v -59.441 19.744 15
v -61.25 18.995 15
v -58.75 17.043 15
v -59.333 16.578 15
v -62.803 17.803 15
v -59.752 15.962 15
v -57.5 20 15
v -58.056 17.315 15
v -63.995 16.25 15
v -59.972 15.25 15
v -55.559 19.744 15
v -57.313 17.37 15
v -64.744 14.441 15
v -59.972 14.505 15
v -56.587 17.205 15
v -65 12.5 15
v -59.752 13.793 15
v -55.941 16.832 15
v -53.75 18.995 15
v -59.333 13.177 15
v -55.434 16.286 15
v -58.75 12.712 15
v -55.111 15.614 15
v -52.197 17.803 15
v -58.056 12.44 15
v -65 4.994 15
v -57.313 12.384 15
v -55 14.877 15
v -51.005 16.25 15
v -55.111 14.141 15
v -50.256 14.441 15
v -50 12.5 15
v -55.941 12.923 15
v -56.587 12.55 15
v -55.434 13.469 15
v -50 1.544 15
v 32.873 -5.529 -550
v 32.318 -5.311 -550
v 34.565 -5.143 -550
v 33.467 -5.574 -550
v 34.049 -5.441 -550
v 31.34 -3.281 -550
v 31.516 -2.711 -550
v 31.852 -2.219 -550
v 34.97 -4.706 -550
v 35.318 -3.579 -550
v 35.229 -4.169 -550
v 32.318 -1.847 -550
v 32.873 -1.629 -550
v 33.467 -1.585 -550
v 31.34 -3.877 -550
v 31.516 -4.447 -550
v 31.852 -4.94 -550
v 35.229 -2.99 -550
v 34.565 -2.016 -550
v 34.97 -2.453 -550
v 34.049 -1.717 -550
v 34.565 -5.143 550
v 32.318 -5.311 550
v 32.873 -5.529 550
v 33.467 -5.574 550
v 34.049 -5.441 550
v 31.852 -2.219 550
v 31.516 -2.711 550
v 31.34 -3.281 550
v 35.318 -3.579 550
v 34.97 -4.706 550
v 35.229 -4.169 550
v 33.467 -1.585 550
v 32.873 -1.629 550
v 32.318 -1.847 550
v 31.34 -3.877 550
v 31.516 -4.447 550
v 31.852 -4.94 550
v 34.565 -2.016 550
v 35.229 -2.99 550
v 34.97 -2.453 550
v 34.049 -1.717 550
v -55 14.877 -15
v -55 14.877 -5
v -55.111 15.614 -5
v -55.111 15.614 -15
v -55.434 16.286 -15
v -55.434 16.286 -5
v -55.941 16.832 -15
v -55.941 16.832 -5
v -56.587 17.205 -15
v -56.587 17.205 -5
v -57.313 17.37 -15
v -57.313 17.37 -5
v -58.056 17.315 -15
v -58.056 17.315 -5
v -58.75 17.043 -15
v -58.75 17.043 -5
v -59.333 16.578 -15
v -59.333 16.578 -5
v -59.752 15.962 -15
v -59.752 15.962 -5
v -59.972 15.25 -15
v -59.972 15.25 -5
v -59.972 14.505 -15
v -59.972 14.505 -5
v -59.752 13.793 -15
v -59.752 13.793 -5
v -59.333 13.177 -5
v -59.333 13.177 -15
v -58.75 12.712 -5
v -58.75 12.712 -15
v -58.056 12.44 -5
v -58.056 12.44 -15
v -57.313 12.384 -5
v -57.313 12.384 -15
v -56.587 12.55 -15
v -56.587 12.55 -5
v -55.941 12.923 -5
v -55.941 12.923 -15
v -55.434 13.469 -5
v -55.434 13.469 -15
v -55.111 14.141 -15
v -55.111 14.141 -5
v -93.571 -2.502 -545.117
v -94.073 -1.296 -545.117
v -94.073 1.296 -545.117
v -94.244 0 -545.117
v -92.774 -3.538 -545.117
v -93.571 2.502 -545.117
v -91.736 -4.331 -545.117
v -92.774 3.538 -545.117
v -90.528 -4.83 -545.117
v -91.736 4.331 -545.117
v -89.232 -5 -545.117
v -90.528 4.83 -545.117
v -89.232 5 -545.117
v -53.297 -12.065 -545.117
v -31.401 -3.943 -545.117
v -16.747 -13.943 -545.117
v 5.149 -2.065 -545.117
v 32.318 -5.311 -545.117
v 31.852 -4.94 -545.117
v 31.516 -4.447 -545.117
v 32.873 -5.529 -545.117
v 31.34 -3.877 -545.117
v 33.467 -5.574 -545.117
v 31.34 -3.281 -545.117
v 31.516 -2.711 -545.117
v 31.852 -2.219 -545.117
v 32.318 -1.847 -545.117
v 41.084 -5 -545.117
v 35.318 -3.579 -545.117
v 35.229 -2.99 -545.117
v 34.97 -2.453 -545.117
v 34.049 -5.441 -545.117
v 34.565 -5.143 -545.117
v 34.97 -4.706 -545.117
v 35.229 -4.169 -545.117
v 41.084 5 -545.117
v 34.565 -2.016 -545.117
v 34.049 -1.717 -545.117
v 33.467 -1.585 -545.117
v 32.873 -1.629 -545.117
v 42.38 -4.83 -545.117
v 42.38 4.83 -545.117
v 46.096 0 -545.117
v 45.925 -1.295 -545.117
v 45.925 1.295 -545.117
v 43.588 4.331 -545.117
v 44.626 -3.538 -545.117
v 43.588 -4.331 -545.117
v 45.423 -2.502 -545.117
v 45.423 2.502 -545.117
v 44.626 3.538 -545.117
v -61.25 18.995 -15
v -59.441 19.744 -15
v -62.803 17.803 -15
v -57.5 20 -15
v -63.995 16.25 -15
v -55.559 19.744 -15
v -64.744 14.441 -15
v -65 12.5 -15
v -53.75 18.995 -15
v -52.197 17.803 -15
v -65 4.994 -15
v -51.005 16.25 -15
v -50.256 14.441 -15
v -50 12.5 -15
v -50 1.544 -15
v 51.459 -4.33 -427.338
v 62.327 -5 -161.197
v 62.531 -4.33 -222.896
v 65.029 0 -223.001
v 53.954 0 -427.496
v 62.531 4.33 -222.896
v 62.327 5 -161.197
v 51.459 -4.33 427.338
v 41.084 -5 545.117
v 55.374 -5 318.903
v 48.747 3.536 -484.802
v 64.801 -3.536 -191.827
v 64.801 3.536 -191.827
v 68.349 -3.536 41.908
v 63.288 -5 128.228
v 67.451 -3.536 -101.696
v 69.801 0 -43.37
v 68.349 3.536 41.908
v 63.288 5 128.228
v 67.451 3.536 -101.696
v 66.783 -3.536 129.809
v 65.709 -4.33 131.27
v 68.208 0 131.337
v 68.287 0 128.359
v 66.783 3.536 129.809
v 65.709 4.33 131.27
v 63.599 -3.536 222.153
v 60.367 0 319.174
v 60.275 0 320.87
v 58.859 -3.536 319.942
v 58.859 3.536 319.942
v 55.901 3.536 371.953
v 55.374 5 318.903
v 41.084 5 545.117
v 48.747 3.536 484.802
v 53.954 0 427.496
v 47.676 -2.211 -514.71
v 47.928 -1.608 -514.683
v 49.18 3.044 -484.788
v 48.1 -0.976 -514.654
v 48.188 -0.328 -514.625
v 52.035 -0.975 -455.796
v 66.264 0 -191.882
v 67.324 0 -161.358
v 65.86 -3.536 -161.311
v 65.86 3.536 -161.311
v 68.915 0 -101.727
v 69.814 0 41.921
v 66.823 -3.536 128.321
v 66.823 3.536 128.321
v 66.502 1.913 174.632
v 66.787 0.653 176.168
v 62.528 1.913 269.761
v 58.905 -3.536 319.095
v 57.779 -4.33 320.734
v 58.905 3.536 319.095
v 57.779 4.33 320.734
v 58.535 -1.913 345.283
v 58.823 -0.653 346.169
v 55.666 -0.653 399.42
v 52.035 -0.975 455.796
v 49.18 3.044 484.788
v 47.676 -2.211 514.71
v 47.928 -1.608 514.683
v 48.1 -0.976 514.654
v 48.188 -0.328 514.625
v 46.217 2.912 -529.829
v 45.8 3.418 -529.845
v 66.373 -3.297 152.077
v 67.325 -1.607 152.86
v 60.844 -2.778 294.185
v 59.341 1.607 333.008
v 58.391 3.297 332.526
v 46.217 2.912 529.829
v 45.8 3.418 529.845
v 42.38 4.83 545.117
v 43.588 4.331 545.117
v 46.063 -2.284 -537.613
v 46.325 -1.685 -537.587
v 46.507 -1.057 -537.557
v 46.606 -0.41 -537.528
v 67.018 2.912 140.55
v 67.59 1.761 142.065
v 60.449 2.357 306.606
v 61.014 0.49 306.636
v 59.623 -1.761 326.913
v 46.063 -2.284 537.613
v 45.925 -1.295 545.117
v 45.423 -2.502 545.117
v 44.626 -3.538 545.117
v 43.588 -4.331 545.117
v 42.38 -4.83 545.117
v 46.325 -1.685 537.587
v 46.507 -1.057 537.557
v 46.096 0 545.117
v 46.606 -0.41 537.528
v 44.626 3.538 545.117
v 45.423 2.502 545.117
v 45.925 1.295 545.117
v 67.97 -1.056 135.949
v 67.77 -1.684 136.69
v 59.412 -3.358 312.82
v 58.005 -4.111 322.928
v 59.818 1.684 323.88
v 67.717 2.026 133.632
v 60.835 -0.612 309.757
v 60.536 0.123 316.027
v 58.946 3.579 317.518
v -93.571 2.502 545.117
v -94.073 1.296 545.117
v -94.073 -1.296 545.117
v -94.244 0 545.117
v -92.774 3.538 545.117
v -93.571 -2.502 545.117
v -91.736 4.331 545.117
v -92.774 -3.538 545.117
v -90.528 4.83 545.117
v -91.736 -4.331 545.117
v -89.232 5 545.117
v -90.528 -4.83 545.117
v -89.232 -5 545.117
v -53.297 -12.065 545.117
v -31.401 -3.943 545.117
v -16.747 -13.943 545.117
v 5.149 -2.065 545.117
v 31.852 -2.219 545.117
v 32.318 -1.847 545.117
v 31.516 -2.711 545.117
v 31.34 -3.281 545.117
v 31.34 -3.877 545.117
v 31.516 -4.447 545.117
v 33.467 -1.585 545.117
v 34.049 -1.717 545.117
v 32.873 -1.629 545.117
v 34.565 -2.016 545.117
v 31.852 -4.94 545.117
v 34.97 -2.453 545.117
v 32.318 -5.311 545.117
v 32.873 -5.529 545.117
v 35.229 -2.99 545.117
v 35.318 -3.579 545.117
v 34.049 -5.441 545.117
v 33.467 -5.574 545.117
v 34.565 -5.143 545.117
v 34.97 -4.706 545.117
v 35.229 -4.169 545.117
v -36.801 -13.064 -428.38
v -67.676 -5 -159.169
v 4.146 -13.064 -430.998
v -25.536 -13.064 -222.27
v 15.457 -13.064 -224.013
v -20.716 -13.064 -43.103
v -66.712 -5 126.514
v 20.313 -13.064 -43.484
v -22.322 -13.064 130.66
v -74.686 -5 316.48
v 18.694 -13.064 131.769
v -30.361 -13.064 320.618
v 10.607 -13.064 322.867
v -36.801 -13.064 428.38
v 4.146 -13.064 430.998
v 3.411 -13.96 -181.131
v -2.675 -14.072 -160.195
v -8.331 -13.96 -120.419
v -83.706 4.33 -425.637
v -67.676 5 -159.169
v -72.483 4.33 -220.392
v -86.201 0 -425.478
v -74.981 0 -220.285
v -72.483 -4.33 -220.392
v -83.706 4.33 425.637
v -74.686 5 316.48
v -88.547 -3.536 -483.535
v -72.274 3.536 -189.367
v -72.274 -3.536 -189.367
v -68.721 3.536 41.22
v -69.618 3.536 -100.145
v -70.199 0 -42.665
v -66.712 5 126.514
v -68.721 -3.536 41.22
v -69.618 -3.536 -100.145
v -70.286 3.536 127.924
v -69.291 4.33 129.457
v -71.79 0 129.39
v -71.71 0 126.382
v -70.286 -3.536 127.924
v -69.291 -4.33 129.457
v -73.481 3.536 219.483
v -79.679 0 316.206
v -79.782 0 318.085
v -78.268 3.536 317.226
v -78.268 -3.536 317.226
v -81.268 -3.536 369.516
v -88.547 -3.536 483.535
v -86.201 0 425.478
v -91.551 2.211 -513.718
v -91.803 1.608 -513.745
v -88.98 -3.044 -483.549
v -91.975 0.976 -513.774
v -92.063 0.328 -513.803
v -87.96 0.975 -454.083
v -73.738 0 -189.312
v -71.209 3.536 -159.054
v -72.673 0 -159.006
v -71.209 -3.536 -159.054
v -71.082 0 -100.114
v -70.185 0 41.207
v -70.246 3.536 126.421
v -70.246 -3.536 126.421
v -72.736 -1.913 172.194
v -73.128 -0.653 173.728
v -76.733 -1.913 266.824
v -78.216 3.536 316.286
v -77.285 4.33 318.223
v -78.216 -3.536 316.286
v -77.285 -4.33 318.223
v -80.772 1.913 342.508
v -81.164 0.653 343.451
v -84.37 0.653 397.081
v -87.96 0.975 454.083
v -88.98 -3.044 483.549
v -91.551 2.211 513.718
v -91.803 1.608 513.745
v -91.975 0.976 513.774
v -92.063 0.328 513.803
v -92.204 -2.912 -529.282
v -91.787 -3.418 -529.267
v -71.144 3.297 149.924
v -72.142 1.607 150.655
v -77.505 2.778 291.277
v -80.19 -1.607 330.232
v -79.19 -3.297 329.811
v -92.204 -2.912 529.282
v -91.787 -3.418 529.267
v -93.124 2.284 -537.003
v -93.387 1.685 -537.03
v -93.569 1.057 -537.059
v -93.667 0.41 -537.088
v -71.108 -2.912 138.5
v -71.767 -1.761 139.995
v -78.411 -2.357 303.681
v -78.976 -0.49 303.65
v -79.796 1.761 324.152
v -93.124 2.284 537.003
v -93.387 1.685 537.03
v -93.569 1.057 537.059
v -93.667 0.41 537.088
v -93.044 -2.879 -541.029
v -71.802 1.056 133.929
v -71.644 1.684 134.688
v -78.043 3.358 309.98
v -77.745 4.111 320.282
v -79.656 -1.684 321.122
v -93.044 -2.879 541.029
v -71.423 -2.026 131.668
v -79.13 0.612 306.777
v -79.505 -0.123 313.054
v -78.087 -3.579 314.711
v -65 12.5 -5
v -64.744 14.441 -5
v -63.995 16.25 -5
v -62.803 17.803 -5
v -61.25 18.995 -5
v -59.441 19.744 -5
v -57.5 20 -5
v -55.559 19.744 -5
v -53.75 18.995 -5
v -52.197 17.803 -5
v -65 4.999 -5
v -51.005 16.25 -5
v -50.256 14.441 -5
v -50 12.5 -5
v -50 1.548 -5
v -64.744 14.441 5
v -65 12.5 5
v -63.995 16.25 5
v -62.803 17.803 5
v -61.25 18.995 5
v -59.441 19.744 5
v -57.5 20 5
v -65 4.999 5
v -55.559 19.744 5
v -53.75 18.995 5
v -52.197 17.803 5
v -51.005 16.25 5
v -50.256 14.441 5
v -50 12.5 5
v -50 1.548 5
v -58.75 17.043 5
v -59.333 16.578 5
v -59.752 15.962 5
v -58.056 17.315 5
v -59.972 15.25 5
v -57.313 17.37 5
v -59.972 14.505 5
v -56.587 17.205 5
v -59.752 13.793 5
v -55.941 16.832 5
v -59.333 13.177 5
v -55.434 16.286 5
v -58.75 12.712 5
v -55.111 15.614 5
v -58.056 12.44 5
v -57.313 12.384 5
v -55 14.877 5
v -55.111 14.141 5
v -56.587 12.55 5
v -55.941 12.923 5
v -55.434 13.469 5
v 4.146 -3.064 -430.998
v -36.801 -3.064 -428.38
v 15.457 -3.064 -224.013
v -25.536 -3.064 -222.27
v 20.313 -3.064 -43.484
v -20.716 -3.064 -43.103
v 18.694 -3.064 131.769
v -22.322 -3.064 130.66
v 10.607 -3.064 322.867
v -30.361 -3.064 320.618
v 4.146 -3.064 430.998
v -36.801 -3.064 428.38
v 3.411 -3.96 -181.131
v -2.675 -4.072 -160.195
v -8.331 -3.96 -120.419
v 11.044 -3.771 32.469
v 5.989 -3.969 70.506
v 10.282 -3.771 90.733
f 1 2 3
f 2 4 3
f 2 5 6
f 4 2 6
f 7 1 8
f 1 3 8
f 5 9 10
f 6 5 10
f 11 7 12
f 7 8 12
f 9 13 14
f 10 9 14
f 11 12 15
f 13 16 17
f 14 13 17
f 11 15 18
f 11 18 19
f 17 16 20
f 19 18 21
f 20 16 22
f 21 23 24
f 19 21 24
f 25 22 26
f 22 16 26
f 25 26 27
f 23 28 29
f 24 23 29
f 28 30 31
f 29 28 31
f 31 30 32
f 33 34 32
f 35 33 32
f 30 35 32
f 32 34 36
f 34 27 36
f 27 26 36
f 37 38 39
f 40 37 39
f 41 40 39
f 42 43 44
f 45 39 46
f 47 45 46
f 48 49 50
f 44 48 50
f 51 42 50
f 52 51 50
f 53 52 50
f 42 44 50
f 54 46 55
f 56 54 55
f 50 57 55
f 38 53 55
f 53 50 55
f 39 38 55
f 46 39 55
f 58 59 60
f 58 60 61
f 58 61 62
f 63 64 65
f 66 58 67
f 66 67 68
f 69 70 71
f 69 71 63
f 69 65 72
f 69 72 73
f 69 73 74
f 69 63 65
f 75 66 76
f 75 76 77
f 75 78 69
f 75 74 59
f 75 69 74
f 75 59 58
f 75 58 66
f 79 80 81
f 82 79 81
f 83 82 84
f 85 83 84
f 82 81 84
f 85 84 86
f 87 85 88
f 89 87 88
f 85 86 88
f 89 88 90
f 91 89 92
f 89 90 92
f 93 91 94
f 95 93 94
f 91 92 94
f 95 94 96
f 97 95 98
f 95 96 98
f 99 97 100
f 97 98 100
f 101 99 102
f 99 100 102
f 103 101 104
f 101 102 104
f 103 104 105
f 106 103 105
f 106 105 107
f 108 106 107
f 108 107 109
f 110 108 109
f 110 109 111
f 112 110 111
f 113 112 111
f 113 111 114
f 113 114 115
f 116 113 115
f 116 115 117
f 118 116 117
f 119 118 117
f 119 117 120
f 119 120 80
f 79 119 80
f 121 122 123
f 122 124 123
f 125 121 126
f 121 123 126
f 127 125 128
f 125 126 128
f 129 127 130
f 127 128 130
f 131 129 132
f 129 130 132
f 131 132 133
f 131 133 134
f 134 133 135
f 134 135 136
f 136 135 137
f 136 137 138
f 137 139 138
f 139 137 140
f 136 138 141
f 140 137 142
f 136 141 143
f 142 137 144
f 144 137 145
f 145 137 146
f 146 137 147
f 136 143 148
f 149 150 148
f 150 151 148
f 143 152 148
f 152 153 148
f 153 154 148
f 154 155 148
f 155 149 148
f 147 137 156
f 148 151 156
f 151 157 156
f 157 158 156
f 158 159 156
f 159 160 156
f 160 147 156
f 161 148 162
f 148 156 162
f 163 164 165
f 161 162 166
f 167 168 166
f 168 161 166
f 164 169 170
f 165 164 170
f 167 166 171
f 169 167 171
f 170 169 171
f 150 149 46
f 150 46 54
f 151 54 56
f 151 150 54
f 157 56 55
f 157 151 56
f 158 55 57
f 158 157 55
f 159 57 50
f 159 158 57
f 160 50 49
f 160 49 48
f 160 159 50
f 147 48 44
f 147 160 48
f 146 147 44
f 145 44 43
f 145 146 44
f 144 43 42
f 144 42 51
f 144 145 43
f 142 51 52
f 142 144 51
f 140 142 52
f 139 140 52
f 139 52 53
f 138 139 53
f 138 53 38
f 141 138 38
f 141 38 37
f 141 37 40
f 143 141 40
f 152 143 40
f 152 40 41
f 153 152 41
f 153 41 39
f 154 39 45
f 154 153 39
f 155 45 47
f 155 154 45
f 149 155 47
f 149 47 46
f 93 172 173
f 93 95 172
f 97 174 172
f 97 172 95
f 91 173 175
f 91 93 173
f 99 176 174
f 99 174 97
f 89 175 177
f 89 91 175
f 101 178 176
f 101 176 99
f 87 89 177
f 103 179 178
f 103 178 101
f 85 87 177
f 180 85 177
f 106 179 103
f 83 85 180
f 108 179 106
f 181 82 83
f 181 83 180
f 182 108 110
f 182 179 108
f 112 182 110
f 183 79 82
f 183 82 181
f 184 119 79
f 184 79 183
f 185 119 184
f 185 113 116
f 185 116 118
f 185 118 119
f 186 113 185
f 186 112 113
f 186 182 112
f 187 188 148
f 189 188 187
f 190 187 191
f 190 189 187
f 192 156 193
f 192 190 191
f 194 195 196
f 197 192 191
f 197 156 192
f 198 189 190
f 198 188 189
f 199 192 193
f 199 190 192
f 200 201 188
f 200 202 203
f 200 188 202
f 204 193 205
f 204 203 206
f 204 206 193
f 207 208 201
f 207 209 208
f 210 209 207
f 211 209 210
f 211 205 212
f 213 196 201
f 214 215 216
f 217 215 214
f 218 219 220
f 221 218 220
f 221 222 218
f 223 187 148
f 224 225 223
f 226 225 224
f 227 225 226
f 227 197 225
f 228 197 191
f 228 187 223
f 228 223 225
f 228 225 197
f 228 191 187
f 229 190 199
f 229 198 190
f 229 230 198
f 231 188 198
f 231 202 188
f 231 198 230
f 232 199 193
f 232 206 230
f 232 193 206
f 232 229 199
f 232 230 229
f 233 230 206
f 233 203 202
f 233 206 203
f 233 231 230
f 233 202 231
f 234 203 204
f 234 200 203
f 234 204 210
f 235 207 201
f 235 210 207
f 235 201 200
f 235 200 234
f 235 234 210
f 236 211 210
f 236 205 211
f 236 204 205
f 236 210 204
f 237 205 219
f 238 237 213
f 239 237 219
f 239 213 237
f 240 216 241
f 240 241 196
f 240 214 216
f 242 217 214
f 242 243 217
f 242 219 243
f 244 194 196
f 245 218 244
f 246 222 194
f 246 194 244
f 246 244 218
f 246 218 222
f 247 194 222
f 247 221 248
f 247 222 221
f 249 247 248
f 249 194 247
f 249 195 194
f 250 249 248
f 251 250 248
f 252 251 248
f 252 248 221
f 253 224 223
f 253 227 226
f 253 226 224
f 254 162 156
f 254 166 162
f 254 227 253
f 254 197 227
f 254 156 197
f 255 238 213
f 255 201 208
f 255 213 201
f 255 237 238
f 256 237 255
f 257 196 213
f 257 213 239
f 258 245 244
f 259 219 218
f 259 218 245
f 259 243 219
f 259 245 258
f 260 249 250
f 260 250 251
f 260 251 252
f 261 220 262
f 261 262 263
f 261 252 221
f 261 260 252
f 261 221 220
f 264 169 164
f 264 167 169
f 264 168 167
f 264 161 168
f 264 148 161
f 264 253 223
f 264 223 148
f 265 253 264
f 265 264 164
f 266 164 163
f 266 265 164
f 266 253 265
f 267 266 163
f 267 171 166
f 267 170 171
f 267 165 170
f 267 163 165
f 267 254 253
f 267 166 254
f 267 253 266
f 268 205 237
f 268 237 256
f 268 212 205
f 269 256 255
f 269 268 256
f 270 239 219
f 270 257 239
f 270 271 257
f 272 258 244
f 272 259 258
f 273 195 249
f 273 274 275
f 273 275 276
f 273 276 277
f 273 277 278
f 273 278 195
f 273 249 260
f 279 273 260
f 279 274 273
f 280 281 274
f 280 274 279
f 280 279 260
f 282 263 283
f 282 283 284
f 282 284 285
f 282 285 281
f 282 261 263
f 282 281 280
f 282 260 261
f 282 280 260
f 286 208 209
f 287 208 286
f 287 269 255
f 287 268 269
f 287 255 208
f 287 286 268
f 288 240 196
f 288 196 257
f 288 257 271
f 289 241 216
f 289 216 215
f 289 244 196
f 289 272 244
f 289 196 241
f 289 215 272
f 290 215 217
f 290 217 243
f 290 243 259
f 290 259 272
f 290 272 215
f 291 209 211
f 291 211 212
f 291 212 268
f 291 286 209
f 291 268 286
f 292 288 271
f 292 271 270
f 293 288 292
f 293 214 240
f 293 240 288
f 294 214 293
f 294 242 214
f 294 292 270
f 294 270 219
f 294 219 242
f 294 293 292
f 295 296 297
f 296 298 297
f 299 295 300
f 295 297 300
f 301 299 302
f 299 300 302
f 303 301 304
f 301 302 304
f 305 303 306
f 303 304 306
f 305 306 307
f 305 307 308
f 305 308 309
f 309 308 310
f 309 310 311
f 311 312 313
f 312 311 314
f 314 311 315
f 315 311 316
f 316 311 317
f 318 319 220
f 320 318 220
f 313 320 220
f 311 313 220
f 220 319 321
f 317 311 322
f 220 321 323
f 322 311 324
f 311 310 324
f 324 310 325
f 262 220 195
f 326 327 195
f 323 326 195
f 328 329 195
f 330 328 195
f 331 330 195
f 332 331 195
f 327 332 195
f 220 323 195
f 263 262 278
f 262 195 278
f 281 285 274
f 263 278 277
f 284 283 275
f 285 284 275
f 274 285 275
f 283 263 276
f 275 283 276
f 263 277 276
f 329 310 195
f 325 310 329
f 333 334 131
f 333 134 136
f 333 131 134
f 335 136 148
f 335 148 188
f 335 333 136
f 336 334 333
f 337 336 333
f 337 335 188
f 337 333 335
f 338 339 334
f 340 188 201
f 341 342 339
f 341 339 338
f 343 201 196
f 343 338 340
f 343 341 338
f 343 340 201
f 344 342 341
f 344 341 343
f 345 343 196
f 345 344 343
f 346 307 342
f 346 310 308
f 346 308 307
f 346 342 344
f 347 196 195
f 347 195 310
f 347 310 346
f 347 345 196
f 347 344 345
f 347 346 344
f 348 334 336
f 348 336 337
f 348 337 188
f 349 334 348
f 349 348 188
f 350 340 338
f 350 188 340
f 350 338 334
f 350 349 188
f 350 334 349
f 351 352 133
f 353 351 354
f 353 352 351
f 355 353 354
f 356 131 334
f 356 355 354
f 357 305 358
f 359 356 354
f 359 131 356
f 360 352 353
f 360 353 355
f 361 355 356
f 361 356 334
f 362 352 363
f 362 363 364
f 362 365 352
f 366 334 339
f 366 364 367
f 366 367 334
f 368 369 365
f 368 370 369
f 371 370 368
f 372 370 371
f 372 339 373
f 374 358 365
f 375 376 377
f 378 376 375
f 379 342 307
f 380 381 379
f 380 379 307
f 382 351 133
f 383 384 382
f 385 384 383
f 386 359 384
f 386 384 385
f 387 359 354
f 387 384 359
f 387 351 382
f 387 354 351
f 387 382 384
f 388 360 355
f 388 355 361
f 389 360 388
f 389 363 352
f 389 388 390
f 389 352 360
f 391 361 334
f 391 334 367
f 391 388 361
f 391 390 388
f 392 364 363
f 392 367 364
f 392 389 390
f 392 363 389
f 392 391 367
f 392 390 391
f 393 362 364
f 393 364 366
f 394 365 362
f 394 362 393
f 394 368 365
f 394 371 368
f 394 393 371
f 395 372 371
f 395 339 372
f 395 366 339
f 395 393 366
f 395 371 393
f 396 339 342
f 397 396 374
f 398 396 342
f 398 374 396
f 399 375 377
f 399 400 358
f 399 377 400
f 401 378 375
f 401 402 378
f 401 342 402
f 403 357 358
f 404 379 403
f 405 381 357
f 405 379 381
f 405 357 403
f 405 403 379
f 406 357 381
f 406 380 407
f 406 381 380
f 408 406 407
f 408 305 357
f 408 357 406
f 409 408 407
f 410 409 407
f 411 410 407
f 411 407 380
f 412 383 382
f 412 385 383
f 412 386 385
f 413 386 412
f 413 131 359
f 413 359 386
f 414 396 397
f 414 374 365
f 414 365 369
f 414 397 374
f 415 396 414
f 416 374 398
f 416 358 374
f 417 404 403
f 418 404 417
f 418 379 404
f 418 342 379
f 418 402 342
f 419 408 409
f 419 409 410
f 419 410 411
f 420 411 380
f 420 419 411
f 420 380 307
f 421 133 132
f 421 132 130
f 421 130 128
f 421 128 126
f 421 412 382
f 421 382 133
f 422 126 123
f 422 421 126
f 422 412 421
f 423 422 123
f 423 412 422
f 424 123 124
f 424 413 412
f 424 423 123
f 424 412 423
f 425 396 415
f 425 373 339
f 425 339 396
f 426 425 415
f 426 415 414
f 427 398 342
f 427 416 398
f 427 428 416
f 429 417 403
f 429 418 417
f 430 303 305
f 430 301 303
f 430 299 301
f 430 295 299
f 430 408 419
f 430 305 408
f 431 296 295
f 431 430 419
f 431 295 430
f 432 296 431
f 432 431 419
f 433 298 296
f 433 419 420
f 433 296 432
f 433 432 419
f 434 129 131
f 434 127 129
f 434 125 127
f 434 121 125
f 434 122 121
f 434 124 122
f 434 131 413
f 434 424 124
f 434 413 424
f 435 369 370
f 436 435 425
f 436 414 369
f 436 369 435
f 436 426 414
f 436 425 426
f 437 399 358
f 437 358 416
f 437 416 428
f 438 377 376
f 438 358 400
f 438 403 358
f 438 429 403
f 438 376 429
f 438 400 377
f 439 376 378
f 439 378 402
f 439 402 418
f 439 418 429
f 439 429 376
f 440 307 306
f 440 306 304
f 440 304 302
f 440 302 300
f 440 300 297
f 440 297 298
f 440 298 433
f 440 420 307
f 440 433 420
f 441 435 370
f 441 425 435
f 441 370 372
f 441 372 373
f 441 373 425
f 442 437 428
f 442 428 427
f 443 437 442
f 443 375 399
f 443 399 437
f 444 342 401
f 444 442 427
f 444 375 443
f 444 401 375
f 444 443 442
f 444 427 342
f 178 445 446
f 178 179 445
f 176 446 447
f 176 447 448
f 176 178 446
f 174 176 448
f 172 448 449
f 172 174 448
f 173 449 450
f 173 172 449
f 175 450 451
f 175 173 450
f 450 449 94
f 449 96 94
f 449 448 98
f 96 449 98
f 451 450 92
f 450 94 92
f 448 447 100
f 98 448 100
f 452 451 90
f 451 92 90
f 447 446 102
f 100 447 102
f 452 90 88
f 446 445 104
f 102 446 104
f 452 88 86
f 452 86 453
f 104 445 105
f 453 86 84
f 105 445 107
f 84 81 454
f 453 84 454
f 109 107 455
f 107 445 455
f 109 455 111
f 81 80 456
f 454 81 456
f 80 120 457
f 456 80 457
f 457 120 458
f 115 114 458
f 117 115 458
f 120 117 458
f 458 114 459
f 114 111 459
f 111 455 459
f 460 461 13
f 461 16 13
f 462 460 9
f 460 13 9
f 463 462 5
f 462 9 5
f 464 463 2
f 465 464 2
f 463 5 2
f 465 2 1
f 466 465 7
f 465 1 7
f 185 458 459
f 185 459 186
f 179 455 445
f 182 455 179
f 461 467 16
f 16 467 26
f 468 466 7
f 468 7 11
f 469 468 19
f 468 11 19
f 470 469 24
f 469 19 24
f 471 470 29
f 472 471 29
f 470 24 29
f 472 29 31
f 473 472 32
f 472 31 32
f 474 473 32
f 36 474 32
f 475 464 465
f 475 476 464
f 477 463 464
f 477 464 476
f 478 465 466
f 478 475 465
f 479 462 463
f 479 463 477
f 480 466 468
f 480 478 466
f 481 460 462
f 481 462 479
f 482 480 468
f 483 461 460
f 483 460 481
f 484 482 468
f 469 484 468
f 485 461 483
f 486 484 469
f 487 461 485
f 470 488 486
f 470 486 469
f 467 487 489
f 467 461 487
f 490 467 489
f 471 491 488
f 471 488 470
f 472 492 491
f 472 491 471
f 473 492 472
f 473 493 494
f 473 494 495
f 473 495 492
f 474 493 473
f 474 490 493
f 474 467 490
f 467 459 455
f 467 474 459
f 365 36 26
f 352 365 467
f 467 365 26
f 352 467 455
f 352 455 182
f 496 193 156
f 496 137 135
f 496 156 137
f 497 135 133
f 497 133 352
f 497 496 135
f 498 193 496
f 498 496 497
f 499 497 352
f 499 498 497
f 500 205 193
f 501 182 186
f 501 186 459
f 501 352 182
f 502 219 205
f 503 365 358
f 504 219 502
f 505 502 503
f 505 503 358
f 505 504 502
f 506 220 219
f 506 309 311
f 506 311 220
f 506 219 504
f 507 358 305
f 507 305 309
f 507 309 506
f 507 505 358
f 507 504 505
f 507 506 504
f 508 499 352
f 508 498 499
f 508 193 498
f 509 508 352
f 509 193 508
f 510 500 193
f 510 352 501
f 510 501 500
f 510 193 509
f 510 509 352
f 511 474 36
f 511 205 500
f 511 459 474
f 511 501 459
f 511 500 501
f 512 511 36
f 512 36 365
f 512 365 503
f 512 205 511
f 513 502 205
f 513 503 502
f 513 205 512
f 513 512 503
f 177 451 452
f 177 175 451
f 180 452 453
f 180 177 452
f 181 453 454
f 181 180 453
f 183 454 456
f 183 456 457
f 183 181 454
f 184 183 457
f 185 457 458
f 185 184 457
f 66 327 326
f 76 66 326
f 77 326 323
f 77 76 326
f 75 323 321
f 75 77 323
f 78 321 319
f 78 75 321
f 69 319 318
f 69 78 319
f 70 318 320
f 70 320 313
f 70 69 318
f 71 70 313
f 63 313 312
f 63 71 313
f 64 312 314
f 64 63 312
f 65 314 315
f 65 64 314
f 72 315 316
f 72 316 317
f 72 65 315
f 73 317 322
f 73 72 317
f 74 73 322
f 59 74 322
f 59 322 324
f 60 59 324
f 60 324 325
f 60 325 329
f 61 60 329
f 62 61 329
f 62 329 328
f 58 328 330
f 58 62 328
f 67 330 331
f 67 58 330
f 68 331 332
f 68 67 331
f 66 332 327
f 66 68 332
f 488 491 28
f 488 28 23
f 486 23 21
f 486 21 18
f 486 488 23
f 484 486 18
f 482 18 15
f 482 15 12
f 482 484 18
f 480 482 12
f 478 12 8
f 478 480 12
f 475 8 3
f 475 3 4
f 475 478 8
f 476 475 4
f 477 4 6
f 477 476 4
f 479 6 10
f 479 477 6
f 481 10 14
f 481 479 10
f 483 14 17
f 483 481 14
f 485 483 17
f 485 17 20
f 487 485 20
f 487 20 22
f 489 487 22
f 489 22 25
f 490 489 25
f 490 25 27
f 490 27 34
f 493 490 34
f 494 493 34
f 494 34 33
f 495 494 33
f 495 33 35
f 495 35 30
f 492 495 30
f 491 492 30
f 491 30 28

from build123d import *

# Parameters (mm, degrees)
SKETCH4_W            = 143.511953983
SKETCH4_H            = 18.108430665
SKETCH4_W_2          = 146.403726808
SKETCH4_H_2          = 23.968157225
CUT_EXTRUDE1_DEPTH   = 32.5
SKETCH3_R            = 2
BOSS_EXTRUDE1_DEPTH  = 550
SKETCH5_W            = 15
SKETCH5_H            = 10
BOSS_EXTRUDE2_DEPTH  = 20
CUT_EXTRUDE2_REACH   = 565.3
SKETCH6_R            = 2.5
FILLET1_R            = 7.5
FILLET1_OF_MIRROR1_R = 7.5


with BuildPart() as part:
    # Sweep2: sweep along a path in Sketch2
    with BuildLine() as sweep2_path:  # in the path sketch's own coordinates; laid on its plane below (add() does not lay a ready-made edge on the line's plane)
        add(Edge.make_bspline(
            [(-24.41476581, 550), (8.13825527, 84.470109879), (8.13825527, -84.470109879), (-24.41476581, -550)],
            knots=[0, 0, 0, 0, 1, 1, 1, 1], degree=3))
    # Sketch1 → Sweep2 (sweep)
    with BuildSketch(Plane.XY):
        with BuildLine():
            ThreePointArc((65, -5), (70, 0), (65, 5))
            add(Edge.make_bspline(
                [(-65, 5), (-16.485213686, -7.09609478), (16.485213686, -7.09609478), (65, 5)],
                knots=[0, 0, 0, 0, 1, 1, 1, 1], degree=3))
            ThreePointArc((-65, 5), (-70, 0), (-65, -5))
            add(Edge.make_bspline(
                [(-65, -5), (-16.485213686, -17.09609478), (16.485213686, -17.09609478), (65, -5)],
                knots=[0, 0, 0, 0, 1, 1, 1, 1], degree=3))
        make_face()
    sweep(path=Plane(origin=(0, 0, 0), x_dir=(1, 0, 0), z_dir=(0, 1, 0)) * sweep2_path.line)

    # Sketch4 → Cut-Extrude1 (cut, symmetric)
    with BuildSketch(Plane(origin=(0, 0, 0), x_dir=(1, 0, 0), z_dir=(0, 1, 0))):
        with Locations((-22.488272338, -554.171262171)):
            Rectangle(SKETCH4_W, SKETCH4_H)
        with Locations((-21.042385925, 557.101125451)):
            Rectangle(SKETCH4_W_2, SKETCH4_H_2)
    extrude(amount=CUT_EXTRUDE1_DEPTH, both=True, mode=Mode.SUBTRACT)

    # Sketch3 → Boss-Extrude1 (add, symmetric)
    with BuildSketch(Plane.XY):
        with Locations((33.317999856, -3.579245113)):
            Circle(SKETCH3_R)
    extrude(amount=BOSS_EXTRUDE1_DEPTH, both=True)

    # Sketch5 → Boss-Extrude2 (add)
    with BuildSketch(Plane(origin=(0, 0, 0), x_dir=(1, 0, 0), z_dir=(0, 1, 0))):
        with Locations((-57.5, 10)):
            Rectangle(SKETCH5_W, SKETCH5_H)
    boss_extrude2 = extrude(amount=BOSS_EXTRUDE2_DEPTH)

    # Sketch6 → Cut-Extrude2 (cut, up to next)
    with BuildSketch(Plane.XY.offset(-5), mode=Mode.PRIVATE) as cut_extrude2_sk1:
        with Locations((-57.5, 14.877458303)):
            Circle(SKETCH6_R)
    cut_extrude2_tool1 = extrude(cut_extrude2_sk1.sketch, amount=-CUT_EXTRUDE2_REACH, mode=Mode.PRIVATE) & part.part
    cut_extrude2 = cut_extrude2_tool1.solids().sort_by_distance((-57.5, 14.877458, -5))[0]
    add(cut_extrude2, mode=Mode.SUBTRACT)

    # Fillet1
    fillet1_edges = [part.edges().sort_by_distance(p)[0] for p in [
        (-50, 20, -10),
        (-65, 20, -10),
    ]]
    fillet(fillet1_edges, radius=FILLET1_R - 0.0001)  # a hair under: the kernel refuses the full size

    # Mirror1: Boss-Extrude2, Cut-Extrude2 across plane
    add(boss_extrude2.mirror(Plane.XY))
    add(cut_extrude2.mirror(Plane.XY), mode=Mode.SUBTRACT)

    # Fillet1 of Mirror1
    fillet1_of_mirror1_edges = [part.edges().sort_by_distance(p)[0] for p in [
        (-50, 20, 10),
        (-65, 20, 10),
    ]]
    fillet(fillet1_of_mirror1_edges, radius=FILLET1_OF_MIRROR1_R - 0.0001)  # a hair under: the kernel refuses the full size


solid = part.part
